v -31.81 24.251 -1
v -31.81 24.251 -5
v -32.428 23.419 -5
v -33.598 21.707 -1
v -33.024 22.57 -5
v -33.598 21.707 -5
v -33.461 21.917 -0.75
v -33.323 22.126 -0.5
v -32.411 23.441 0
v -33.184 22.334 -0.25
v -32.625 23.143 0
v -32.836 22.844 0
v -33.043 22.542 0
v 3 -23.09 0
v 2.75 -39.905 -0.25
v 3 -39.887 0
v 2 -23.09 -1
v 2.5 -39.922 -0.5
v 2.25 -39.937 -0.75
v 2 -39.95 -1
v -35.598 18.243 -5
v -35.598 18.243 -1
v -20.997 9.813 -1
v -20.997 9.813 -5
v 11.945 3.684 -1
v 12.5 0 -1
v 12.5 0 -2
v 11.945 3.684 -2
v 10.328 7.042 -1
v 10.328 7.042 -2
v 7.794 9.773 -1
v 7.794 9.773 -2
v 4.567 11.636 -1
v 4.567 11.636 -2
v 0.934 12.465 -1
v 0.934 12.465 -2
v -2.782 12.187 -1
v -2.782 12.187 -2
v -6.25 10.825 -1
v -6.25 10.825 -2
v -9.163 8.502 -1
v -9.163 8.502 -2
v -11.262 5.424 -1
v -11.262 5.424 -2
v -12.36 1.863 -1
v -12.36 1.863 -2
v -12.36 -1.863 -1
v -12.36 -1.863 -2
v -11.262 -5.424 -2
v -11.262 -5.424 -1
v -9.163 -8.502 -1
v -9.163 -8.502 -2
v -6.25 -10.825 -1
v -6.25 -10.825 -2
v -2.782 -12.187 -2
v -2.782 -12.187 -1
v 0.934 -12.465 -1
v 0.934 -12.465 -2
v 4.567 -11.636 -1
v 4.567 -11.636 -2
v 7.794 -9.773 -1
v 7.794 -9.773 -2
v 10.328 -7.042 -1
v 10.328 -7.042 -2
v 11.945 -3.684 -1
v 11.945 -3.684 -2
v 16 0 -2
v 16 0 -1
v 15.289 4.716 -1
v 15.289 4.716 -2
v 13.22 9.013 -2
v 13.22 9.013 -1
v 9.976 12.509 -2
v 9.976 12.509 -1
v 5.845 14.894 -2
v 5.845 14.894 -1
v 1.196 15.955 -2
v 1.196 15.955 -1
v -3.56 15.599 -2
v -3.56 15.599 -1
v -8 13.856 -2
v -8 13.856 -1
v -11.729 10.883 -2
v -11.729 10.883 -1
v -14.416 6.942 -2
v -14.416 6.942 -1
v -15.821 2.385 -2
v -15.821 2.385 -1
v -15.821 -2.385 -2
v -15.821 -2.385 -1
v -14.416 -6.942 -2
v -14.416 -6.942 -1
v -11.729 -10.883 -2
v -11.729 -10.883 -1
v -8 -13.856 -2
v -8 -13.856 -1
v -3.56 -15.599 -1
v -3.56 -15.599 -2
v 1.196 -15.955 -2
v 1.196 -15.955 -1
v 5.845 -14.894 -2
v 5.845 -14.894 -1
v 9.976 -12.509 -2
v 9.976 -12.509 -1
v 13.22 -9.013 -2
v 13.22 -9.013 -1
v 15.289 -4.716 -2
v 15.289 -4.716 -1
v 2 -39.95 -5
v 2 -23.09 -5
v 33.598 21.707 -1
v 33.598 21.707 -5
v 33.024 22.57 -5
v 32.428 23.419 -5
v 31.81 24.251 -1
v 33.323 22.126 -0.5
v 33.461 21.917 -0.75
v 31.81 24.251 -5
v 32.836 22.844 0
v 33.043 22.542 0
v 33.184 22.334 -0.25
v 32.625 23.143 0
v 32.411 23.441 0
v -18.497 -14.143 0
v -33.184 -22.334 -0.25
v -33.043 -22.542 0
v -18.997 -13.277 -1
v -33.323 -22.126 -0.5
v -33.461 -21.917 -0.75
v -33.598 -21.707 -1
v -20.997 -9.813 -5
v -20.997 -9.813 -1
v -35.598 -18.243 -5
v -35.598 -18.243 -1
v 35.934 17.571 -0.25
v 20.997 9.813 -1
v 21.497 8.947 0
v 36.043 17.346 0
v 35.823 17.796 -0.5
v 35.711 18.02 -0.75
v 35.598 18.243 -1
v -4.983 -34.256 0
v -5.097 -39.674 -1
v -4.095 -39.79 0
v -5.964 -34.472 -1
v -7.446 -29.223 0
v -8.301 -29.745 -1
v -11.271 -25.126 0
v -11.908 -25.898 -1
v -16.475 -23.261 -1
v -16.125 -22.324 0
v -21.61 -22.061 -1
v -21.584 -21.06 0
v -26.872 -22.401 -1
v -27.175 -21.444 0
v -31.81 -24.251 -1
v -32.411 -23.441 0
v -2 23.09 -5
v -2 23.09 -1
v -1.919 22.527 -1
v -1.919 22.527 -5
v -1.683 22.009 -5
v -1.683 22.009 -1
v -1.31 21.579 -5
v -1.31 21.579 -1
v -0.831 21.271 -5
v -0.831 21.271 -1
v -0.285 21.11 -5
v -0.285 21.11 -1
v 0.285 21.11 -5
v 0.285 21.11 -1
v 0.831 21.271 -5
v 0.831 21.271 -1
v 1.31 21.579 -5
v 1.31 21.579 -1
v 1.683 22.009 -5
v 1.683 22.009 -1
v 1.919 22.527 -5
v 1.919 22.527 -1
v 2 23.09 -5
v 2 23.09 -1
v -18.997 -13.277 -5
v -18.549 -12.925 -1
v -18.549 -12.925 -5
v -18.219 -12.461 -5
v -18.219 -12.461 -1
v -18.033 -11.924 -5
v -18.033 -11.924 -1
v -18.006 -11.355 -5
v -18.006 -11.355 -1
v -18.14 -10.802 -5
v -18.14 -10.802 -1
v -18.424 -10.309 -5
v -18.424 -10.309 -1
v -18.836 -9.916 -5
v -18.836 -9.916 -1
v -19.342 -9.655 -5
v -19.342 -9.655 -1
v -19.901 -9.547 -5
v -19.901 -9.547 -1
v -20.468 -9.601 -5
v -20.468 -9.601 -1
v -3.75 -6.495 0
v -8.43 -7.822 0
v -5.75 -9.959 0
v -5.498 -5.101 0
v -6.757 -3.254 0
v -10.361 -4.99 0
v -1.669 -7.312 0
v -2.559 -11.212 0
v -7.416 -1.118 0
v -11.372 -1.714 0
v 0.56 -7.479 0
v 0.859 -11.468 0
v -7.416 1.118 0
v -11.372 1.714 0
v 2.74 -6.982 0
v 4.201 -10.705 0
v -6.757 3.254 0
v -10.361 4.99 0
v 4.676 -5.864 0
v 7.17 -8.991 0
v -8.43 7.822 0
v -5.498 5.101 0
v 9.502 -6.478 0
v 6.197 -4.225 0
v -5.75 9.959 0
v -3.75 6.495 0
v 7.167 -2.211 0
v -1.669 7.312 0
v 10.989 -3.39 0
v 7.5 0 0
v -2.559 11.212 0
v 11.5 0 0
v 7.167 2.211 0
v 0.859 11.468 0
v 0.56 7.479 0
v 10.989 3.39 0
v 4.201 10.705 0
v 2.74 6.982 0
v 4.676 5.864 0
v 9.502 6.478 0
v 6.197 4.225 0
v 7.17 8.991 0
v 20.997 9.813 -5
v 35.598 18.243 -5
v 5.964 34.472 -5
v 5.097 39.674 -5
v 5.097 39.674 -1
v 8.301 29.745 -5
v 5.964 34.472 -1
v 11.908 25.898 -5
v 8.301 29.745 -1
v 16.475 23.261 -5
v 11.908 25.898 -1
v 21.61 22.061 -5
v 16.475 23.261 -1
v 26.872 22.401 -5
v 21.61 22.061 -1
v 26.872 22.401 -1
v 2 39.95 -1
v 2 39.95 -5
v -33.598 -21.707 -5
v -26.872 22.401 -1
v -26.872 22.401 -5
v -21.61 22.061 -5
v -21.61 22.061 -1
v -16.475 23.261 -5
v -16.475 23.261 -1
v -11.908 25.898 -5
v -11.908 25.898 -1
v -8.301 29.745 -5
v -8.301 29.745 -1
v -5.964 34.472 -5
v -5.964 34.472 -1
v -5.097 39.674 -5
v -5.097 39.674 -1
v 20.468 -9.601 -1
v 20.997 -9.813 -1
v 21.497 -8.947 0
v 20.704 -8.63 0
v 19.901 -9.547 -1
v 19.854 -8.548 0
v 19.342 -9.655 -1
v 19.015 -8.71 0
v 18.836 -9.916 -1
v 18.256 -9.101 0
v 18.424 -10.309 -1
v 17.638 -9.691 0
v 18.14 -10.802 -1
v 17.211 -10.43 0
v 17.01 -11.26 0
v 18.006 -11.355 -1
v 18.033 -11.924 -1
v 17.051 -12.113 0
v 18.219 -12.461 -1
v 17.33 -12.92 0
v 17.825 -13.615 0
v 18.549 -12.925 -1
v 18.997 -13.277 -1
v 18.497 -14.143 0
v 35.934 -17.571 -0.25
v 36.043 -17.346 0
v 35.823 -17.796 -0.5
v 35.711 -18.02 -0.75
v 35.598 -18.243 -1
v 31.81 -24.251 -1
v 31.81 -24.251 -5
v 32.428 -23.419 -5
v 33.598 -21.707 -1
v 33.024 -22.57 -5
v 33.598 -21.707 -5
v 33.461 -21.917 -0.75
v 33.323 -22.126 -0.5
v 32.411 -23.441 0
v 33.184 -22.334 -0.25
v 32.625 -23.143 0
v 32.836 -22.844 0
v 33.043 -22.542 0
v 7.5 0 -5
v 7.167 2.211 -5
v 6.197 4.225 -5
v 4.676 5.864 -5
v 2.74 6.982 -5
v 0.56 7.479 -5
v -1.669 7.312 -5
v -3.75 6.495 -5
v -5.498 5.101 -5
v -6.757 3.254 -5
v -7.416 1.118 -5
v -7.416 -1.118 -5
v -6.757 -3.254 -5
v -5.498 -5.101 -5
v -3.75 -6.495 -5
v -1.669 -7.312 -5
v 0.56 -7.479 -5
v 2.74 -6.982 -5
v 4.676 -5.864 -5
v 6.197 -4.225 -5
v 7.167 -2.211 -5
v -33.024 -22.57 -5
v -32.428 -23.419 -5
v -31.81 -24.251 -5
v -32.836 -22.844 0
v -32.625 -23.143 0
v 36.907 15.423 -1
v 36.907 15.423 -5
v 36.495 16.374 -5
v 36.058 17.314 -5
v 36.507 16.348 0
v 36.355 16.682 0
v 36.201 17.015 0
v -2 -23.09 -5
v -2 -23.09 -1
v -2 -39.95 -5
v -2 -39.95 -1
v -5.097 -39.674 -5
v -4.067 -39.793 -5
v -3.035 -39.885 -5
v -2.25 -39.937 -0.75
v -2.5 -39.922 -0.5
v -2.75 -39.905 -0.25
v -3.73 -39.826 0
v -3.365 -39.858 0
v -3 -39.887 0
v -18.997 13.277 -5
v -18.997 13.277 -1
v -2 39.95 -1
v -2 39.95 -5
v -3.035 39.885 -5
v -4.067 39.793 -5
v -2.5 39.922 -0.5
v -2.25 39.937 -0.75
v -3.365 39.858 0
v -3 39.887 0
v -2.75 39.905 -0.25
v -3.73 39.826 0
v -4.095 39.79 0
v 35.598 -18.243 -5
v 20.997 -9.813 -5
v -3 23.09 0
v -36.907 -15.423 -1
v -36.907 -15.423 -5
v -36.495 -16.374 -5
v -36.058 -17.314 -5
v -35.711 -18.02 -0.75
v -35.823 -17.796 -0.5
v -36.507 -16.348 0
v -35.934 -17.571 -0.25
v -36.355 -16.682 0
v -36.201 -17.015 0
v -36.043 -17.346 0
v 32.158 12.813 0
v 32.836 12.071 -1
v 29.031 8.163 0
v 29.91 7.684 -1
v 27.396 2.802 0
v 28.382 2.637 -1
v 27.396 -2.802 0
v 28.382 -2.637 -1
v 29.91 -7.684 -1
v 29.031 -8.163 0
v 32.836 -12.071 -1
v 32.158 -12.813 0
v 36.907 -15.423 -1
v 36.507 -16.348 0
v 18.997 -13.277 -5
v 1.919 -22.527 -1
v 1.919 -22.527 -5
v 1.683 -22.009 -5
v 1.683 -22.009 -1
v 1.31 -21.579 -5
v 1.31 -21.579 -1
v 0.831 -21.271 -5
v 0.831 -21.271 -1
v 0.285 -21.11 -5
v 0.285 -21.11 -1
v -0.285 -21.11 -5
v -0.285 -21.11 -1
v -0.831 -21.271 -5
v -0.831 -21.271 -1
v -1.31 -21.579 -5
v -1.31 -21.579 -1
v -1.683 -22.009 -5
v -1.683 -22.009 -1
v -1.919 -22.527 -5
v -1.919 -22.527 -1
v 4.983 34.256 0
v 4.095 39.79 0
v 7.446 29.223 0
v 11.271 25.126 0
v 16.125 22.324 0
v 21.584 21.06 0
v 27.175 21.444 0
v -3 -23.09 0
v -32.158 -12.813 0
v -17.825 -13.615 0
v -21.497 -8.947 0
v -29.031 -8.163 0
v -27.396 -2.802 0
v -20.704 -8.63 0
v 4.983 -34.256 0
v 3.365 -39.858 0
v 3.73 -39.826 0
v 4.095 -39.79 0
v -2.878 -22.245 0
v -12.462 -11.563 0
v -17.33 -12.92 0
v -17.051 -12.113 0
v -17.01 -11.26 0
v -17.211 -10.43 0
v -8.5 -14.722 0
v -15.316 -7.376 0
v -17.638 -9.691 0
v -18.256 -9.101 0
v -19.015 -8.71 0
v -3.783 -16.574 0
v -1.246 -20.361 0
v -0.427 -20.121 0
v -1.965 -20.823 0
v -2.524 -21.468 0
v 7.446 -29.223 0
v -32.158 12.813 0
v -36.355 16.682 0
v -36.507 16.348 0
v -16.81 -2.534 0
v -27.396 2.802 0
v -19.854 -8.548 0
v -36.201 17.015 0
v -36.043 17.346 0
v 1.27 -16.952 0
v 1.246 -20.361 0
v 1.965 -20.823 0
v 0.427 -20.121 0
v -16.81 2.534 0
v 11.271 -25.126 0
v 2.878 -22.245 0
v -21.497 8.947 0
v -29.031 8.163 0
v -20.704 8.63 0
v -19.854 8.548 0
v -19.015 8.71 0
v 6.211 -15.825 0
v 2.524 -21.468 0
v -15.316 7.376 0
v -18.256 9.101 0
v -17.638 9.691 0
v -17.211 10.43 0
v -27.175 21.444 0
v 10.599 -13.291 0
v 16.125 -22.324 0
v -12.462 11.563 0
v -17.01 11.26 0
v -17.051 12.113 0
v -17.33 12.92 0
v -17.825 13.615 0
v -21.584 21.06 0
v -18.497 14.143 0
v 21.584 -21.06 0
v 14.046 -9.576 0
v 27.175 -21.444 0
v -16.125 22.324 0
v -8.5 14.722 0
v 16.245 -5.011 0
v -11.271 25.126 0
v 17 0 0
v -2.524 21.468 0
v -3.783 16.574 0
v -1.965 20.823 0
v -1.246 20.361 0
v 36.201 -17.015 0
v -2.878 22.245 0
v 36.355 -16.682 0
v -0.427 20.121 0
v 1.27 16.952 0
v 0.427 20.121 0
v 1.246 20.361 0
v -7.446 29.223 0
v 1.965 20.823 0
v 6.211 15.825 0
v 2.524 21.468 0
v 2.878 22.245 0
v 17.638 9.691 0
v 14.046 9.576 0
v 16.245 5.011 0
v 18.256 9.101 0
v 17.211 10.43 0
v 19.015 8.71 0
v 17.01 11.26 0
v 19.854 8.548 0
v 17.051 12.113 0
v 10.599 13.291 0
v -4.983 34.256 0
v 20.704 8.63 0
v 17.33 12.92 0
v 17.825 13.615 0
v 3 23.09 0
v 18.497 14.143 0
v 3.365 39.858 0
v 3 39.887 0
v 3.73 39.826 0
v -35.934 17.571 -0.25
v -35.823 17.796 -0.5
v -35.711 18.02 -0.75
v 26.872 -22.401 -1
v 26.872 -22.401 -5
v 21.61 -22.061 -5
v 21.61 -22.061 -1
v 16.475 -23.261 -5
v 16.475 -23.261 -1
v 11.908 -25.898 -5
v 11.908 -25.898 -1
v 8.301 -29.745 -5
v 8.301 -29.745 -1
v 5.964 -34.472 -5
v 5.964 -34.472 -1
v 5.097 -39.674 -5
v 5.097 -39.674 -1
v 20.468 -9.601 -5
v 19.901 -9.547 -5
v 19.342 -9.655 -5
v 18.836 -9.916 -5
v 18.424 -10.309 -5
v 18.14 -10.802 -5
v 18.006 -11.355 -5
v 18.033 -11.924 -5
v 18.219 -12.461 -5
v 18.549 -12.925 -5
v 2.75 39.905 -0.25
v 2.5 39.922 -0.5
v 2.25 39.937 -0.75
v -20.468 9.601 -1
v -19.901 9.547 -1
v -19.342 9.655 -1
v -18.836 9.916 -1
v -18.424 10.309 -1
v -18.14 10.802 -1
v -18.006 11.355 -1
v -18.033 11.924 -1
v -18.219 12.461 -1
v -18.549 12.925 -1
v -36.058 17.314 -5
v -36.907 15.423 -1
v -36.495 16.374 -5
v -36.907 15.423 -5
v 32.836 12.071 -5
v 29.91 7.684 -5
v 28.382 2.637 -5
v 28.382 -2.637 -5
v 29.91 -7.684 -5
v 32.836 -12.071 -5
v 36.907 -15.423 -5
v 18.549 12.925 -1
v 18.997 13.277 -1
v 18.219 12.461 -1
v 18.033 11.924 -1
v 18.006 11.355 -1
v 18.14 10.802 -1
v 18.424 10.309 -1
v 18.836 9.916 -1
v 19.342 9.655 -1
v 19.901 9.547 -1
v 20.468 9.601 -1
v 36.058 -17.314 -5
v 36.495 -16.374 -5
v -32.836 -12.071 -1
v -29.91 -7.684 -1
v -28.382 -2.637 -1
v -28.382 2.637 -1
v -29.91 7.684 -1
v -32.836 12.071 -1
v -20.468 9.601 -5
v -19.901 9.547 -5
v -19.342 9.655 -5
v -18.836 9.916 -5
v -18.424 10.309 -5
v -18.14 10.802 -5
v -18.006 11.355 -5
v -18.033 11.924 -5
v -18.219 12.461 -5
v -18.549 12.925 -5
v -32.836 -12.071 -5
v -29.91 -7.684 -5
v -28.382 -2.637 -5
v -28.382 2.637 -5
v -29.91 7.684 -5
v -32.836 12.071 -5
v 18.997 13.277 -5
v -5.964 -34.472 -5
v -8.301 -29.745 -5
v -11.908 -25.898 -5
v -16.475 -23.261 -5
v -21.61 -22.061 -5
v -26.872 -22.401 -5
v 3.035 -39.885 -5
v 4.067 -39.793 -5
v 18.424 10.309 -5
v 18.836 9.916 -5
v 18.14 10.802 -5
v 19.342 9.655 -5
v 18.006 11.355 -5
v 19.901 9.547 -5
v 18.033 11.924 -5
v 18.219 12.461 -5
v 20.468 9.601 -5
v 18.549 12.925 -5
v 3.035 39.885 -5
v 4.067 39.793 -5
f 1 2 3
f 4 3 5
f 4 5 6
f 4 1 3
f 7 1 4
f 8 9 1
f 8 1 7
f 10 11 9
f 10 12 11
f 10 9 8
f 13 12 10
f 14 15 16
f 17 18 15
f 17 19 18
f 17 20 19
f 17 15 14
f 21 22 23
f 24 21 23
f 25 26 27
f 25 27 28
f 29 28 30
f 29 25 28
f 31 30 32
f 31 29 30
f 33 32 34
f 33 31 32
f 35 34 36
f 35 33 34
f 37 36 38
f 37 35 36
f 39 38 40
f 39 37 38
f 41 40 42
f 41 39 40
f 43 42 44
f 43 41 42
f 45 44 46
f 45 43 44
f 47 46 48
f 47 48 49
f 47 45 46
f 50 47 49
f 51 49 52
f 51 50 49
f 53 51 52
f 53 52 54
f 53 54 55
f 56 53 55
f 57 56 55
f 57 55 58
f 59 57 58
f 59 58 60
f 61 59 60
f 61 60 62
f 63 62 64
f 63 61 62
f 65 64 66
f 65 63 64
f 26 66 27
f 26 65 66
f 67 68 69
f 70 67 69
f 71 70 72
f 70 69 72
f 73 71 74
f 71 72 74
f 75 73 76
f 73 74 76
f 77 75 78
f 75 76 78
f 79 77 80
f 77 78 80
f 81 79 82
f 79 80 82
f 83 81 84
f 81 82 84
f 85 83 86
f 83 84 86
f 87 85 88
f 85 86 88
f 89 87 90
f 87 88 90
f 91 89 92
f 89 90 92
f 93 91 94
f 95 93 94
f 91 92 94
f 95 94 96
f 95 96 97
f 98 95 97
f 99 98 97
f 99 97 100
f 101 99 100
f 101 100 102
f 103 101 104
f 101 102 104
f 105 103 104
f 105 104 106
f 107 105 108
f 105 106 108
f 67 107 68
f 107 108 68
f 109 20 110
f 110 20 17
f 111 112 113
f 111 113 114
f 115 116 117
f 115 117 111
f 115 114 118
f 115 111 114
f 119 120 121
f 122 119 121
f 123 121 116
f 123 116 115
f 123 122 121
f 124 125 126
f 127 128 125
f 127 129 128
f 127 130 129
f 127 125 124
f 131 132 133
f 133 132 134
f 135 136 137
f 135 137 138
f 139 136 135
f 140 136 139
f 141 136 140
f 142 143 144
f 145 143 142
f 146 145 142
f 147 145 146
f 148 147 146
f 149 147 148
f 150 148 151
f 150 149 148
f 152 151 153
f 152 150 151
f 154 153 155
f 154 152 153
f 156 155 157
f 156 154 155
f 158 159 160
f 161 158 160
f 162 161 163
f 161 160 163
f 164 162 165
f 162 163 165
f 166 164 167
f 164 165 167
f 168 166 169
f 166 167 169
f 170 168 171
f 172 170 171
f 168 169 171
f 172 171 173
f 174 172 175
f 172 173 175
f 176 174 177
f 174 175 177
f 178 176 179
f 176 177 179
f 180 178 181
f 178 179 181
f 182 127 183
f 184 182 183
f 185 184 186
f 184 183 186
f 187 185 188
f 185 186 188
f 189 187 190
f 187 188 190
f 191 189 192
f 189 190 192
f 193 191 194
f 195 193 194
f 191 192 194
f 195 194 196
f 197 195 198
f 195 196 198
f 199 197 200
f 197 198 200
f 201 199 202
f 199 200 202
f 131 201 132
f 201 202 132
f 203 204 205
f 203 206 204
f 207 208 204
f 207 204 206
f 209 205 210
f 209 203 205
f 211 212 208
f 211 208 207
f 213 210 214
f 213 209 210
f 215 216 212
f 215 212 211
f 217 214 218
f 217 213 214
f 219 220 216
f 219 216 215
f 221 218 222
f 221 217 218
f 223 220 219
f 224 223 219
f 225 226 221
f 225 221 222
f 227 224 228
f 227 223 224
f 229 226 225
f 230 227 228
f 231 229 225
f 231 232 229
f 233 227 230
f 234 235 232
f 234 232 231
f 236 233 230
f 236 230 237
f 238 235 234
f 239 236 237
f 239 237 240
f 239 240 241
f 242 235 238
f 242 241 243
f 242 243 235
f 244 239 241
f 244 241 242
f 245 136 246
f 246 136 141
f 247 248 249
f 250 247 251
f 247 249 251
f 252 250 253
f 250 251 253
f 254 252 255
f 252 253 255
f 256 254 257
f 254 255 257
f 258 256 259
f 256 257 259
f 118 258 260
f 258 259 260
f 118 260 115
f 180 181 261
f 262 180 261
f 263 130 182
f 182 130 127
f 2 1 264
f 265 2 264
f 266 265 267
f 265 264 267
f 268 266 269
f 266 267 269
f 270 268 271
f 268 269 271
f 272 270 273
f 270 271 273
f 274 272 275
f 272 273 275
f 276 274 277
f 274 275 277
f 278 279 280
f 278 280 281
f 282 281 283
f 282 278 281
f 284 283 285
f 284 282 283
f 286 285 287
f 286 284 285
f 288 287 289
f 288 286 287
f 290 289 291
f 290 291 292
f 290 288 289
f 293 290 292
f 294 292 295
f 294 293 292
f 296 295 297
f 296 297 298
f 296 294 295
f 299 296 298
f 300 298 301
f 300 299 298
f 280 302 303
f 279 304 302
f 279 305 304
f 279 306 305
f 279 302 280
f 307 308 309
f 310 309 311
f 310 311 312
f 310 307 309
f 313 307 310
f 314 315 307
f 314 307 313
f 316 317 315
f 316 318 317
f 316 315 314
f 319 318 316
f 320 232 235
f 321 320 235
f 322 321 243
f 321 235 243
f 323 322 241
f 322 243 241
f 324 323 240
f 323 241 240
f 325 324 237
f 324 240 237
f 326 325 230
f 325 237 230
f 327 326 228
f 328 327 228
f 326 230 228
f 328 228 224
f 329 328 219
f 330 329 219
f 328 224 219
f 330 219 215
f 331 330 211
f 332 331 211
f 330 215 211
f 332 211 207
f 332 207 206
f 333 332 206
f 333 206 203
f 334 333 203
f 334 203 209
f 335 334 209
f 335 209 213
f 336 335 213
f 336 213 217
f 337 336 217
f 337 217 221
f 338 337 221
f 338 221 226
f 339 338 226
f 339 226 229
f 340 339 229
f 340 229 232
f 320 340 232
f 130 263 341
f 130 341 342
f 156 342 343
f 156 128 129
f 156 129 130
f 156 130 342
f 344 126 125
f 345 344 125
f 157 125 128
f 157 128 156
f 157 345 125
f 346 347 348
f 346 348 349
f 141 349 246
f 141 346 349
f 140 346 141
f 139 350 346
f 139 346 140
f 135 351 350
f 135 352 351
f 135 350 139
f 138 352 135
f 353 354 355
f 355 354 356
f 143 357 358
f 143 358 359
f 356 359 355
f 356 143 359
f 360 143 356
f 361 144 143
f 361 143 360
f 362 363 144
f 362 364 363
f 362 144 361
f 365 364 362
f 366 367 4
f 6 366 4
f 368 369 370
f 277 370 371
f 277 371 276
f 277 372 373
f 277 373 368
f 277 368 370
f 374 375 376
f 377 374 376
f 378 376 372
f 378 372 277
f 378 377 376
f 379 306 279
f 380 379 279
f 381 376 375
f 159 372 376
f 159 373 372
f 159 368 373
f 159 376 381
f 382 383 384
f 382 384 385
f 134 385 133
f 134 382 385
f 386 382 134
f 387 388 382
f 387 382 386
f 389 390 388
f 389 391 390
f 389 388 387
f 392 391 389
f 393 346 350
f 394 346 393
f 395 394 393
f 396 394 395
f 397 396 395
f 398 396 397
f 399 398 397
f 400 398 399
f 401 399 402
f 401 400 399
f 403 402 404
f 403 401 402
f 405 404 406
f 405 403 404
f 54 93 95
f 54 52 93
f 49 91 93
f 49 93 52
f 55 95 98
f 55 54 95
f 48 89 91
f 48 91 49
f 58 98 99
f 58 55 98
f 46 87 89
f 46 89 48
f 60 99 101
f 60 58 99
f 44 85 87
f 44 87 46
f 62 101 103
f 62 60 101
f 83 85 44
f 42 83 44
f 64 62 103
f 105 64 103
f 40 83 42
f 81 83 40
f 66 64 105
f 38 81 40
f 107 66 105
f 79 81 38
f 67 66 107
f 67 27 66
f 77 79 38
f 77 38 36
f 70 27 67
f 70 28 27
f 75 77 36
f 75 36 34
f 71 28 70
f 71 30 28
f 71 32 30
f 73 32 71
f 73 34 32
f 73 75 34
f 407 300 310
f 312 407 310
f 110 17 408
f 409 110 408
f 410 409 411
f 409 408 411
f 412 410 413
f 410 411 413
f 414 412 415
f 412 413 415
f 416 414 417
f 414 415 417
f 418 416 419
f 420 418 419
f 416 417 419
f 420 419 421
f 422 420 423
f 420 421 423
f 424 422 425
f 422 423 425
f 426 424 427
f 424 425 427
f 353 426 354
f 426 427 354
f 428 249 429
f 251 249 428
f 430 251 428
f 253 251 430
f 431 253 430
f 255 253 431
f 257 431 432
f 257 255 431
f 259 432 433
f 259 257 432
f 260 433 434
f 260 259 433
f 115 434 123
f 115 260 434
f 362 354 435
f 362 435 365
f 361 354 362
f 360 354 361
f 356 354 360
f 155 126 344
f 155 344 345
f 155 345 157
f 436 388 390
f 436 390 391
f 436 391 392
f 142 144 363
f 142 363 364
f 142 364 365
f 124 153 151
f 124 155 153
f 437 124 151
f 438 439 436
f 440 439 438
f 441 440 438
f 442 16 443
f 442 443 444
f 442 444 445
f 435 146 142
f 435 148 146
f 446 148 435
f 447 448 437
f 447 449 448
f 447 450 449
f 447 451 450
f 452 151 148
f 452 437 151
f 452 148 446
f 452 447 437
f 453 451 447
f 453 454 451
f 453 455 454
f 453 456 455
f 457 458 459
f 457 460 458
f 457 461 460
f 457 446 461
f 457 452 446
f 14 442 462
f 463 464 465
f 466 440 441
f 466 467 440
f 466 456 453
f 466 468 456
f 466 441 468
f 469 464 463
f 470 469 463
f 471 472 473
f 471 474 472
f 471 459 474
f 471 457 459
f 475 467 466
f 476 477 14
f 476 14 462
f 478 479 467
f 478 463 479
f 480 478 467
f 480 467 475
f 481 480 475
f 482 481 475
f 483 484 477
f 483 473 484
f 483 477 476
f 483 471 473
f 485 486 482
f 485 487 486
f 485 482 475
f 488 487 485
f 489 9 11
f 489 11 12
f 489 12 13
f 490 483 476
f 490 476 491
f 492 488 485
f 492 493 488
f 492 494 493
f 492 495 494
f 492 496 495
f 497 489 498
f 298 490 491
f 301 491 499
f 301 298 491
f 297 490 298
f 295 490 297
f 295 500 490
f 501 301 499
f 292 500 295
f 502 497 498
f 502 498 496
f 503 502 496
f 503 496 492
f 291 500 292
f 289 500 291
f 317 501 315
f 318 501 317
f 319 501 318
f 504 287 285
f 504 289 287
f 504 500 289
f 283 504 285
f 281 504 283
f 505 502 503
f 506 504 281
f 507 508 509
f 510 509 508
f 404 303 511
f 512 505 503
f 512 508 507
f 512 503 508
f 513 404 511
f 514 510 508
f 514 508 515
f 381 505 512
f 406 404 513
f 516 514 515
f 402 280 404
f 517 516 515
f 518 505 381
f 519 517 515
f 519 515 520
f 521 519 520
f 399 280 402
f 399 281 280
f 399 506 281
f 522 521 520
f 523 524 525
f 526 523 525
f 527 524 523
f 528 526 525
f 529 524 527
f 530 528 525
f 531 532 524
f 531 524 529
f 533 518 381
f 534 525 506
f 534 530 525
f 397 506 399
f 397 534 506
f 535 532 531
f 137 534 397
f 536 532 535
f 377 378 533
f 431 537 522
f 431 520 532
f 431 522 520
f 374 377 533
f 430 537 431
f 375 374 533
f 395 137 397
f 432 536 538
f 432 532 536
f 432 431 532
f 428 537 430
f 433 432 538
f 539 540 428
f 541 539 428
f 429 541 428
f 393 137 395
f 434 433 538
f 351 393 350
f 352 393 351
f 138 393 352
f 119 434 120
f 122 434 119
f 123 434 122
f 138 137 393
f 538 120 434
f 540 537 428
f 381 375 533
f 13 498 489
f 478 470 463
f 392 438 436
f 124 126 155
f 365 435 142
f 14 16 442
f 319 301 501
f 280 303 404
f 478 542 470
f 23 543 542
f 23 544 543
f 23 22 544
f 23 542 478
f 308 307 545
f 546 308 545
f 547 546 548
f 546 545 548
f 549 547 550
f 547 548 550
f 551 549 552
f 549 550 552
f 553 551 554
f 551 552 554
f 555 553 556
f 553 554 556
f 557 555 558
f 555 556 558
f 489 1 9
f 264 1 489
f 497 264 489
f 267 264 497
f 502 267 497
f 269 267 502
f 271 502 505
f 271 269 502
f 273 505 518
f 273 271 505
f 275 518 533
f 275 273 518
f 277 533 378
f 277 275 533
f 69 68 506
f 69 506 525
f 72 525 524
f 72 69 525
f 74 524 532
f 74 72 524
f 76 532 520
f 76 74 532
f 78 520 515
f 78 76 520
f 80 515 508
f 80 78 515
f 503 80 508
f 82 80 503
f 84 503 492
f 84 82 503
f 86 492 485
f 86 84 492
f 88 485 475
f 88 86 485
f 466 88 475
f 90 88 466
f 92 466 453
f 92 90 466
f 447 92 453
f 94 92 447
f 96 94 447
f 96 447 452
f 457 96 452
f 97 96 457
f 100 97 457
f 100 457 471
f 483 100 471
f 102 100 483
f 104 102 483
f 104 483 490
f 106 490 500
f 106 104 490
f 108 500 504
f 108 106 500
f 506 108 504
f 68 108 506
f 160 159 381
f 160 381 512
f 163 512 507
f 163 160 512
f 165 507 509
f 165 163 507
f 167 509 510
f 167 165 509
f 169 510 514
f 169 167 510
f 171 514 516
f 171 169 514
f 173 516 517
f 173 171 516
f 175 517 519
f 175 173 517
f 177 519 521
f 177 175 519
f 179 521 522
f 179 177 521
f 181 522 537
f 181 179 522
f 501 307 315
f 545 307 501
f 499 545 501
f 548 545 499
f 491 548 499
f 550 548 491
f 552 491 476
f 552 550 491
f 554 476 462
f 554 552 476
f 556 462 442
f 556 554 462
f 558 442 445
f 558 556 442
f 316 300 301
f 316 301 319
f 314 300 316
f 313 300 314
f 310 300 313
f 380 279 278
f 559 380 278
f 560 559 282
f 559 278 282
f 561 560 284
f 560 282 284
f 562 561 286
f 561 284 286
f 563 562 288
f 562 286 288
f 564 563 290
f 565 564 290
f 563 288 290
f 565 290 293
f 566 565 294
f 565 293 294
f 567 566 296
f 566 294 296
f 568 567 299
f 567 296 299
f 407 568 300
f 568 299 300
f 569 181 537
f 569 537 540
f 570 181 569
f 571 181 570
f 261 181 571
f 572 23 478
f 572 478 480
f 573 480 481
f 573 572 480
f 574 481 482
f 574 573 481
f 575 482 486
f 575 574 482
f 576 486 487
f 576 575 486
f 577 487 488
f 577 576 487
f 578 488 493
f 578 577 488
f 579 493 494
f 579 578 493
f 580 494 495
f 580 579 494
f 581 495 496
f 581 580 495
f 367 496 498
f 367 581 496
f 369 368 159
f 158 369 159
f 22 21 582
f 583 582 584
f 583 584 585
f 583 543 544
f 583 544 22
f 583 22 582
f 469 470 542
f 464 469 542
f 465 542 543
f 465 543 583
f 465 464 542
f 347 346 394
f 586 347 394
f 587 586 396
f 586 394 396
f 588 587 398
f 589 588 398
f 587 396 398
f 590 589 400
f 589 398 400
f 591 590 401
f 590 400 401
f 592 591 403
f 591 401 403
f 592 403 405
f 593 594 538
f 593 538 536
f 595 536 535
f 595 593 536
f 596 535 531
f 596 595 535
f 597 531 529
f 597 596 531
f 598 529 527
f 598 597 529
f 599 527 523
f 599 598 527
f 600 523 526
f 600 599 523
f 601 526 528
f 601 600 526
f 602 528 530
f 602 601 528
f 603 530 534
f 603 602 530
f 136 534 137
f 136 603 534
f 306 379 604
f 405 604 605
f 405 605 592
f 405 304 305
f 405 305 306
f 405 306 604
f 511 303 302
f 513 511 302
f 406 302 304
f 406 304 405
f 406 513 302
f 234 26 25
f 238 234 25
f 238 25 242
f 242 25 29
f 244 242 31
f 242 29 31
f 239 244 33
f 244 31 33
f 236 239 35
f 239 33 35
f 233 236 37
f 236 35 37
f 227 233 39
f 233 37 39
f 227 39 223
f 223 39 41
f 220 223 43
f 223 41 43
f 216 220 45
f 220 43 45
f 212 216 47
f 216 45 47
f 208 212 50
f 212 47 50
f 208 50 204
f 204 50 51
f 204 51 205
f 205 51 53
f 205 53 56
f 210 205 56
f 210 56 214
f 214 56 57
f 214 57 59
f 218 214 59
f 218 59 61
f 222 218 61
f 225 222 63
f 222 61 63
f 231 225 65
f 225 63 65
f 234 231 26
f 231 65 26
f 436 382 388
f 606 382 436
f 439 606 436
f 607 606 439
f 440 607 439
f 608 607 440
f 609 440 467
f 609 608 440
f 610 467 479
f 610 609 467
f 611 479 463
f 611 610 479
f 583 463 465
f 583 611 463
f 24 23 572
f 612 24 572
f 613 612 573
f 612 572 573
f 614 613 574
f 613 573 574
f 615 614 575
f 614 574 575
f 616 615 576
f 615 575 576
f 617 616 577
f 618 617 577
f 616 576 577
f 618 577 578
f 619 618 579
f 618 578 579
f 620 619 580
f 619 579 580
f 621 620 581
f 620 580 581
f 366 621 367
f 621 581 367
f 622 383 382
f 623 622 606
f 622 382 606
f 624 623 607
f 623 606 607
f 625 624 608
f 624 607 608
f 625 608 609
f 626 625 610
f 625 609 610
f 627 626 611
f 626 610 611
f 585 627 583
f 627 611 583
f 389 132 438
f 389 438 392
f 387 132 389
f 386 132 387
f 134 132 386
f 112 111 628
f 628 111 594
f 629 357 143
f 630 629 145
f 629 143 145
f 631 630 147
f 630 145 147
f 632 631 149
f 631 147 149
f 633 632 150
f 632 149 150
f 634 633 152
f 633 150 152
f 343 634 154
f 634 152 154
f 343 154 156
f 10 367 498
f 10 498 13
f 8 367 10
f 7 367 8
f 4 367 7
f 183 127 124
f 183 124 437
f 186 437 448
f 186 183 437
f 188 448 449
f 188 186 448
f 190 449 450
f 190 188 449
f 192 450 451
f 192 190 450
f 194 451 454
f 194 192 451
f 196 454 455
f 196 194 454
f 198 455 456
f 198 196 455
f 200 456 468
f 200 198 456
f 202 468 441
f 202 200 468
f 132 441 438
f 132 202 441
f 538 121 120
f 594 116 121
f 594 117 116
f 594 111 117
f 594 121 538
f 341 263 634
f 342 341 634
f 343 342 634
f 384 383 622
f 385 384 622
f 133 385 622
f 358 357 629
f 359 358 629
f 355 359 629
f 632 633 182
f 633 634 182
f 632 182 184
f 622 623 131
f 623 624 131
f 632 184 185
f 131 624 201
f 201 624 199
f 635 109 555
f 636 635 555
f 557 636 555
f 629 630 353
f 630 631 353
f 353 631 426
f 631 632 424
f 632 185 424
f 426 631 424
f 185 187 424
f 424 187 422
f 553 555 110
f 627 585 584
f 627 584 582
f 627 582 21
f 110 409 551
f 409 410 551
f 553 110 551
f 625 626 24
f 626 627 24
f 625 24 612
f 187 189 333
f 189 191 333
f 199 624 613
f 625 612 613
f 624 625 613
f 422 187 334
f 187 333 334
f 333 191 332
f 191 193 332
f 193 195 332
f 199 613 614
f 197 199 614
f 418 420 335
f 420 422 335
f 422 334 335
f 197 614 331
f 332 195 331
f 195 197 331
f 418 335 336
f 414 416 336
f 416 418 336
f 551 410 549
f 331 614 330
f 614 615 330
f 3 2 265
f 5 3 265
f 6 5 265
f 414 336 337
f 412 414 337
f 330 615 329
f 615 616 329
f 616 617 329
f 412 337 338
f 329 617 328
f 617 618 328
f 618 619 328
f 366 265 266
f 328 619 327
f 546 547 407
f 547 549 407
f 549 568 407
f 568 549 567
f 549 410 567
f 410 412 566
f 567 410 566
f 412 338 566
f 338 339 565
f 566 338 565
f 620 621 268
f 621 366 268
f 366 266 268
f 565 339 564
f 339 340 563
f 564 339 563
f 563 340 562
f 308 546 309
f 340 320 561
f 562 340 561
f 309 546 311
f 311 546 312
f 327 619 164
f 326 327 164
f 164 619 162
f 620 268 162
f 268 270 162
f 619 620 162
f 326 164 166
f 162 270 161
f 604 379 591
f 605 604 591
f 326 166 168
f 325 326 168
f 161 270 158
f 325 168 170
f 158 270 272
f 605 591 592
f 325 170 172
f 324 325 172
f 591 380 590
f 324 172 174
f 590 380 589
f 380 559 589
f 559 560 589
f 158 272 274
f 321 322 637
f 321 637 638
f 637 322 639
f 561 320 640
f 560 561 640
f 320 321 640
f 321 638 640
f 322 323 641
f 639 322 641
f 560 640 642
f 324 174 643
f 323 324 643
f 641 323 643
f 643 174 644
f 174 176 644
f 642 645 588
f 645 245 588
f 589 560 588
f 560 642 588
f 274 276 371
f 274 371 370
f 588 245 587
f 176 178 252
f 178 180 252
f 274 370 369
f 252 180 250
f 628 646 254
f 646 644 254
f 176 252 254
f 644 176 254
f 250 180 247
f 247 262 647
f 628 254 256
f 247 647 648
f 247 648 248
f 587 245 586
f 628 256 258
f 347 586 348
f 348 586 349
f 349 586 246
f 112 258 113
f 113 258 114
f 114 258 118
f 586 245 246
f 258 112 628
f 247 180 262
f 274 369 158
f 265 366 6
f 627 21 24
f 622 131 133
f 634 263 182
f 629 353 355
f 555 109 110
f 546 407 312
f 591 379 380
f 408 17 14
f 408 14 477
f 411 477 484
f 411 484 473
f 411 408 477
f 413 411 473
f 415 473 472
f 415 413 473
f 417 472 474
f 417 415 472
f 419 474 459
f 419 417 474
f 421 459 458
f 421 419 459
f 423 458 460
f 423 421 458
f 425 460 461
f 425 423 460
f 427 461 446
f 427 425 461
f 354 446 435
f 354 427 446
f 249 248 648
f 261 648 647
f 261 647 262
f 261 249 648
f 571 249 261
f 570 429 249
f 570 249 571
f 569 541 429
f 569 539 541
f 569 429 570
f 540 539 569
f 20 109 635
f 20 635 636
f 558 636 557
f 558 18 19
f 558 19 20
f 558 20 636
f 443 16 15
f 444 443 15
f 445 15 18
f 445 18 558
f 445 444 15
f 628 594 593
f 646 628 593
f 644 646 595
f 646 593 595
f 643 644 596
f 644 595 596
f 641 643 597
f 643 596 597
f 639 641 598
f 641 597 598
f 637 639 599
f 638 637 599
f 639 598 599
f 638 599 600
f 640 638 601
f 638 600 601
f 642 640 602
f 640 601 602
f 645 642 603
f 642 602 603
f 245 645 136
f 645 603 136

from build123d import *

# Parameters (mm, degrees)
SKETCH_R           = 40
PAD_DEPTH          = 5
SKETCH001_R        = 7.5
SKETCH001_R_2      = 18
POCKET_DEPTH       = 5
POLARPATTERN_COUNT = 6
SKETCH002_R        = 16
SKETCH002_R_2      = 12.5
POCKET001_DEPTH    = 2
CHAMFER_SIZE       = 1
CHAMFER001_SIZE    = 1


with BuildPart() as part:
    # Sketch → Pad (new body)
    with BuildSketch(Plane.XY):
        Circle(SKETCH_R)
    extrude(amount=-PAD_DEPTH)

    # Sketch001 → Pocket (cut)
    with BuildSketch(Plane.XY):
        Circle(SKETCH001_R)
        with Locations((46.188, 0)):
            Circle(SKETCH001_R_2)
        with BuildLine():
            ThreePointArc((-2, 23.09), (0, 21.09), (2, 23.09))
            Line((2, 23.09), (2, 43.09))
            ThreePointArc((2, 43.09), (0, 45.09), (-2, 43.09))
            Line((-2, 43.09), (-2, 23.09))
        make_face()
    pocket = extrude(amount=-POCKET_DEPTH, mode=Mode.SUBTRACT)

    # PolarPattern: Pocket ×6 about axis
    polarpattern_axis = Axis((0, 0, 0), (0, 0, 1))
    for i in range(1, POLARPATTERN_COUNT):
        add(pocket.rotate(polarpattern_axis, i * 360 / POLARPATTERN_COUNT), mode=Mode.SUBTRACT)

    # Sketch002 → Pocket001 (cut)
    with BuildSketch(Plane.XY):
        Circle(SKETCH002_R)
        Circle(SKETCH002_R_2, mode=Mode.SUBTRACT)
    extrude(amount=-POCKET001_DEPTH, mode=Mode.SUBTRACT)

    # Chamfer
    chamfer_edges = [part.edges().sort_by_distance(p)[0] for p in [
        (-16, 0, 0),
        (-12.5, 0, 0),
    ]]
    chamfer(chamfer_edges, length=CHAMFER_SIZE)

    # Chamfer001
    chamfer001_edges = [part.edges().sort_by_distance(p)[0] for p in [
        (-28.188, 0, 0),
        (-28.297107, -14.027941, 0),
        (-18.264476, -10.545, 0),
        (-26.297107, -17.492043, 0),
        (-14.094, -24.411524, 0),
        (-2, -31.519984, 0),
        (0, -21.09, 0),
        (2, -31.519984, 0),
        (14.094, -24.411524, 0),
        (26.297107, -17.492043, 0),
        (18.264476, -10.545, 0),
        (28.297107, -14.027941, 0),
        (28.188, 0, 0),
        (28.297107, 14.027941, 0),
        (18.264476, 10.545, 0),
        (26.297107, 17.492043, 0),
        (14.094, 24.411524, 0),
        (2, 31.519984, 0),
        (0, 21.09, 0),
        (-2, 31.519984, 0),
        (-14.094, 24.411524, 0),
        (-26.297107, 17.492043, 0),
        (-18.264476, 10.545, 0),
        (-28.297107, 14.027941, 0),
    ]]
    chamfer(chamfer001_edges, length=CHAMFER001_SIZE)


solid = part.part
